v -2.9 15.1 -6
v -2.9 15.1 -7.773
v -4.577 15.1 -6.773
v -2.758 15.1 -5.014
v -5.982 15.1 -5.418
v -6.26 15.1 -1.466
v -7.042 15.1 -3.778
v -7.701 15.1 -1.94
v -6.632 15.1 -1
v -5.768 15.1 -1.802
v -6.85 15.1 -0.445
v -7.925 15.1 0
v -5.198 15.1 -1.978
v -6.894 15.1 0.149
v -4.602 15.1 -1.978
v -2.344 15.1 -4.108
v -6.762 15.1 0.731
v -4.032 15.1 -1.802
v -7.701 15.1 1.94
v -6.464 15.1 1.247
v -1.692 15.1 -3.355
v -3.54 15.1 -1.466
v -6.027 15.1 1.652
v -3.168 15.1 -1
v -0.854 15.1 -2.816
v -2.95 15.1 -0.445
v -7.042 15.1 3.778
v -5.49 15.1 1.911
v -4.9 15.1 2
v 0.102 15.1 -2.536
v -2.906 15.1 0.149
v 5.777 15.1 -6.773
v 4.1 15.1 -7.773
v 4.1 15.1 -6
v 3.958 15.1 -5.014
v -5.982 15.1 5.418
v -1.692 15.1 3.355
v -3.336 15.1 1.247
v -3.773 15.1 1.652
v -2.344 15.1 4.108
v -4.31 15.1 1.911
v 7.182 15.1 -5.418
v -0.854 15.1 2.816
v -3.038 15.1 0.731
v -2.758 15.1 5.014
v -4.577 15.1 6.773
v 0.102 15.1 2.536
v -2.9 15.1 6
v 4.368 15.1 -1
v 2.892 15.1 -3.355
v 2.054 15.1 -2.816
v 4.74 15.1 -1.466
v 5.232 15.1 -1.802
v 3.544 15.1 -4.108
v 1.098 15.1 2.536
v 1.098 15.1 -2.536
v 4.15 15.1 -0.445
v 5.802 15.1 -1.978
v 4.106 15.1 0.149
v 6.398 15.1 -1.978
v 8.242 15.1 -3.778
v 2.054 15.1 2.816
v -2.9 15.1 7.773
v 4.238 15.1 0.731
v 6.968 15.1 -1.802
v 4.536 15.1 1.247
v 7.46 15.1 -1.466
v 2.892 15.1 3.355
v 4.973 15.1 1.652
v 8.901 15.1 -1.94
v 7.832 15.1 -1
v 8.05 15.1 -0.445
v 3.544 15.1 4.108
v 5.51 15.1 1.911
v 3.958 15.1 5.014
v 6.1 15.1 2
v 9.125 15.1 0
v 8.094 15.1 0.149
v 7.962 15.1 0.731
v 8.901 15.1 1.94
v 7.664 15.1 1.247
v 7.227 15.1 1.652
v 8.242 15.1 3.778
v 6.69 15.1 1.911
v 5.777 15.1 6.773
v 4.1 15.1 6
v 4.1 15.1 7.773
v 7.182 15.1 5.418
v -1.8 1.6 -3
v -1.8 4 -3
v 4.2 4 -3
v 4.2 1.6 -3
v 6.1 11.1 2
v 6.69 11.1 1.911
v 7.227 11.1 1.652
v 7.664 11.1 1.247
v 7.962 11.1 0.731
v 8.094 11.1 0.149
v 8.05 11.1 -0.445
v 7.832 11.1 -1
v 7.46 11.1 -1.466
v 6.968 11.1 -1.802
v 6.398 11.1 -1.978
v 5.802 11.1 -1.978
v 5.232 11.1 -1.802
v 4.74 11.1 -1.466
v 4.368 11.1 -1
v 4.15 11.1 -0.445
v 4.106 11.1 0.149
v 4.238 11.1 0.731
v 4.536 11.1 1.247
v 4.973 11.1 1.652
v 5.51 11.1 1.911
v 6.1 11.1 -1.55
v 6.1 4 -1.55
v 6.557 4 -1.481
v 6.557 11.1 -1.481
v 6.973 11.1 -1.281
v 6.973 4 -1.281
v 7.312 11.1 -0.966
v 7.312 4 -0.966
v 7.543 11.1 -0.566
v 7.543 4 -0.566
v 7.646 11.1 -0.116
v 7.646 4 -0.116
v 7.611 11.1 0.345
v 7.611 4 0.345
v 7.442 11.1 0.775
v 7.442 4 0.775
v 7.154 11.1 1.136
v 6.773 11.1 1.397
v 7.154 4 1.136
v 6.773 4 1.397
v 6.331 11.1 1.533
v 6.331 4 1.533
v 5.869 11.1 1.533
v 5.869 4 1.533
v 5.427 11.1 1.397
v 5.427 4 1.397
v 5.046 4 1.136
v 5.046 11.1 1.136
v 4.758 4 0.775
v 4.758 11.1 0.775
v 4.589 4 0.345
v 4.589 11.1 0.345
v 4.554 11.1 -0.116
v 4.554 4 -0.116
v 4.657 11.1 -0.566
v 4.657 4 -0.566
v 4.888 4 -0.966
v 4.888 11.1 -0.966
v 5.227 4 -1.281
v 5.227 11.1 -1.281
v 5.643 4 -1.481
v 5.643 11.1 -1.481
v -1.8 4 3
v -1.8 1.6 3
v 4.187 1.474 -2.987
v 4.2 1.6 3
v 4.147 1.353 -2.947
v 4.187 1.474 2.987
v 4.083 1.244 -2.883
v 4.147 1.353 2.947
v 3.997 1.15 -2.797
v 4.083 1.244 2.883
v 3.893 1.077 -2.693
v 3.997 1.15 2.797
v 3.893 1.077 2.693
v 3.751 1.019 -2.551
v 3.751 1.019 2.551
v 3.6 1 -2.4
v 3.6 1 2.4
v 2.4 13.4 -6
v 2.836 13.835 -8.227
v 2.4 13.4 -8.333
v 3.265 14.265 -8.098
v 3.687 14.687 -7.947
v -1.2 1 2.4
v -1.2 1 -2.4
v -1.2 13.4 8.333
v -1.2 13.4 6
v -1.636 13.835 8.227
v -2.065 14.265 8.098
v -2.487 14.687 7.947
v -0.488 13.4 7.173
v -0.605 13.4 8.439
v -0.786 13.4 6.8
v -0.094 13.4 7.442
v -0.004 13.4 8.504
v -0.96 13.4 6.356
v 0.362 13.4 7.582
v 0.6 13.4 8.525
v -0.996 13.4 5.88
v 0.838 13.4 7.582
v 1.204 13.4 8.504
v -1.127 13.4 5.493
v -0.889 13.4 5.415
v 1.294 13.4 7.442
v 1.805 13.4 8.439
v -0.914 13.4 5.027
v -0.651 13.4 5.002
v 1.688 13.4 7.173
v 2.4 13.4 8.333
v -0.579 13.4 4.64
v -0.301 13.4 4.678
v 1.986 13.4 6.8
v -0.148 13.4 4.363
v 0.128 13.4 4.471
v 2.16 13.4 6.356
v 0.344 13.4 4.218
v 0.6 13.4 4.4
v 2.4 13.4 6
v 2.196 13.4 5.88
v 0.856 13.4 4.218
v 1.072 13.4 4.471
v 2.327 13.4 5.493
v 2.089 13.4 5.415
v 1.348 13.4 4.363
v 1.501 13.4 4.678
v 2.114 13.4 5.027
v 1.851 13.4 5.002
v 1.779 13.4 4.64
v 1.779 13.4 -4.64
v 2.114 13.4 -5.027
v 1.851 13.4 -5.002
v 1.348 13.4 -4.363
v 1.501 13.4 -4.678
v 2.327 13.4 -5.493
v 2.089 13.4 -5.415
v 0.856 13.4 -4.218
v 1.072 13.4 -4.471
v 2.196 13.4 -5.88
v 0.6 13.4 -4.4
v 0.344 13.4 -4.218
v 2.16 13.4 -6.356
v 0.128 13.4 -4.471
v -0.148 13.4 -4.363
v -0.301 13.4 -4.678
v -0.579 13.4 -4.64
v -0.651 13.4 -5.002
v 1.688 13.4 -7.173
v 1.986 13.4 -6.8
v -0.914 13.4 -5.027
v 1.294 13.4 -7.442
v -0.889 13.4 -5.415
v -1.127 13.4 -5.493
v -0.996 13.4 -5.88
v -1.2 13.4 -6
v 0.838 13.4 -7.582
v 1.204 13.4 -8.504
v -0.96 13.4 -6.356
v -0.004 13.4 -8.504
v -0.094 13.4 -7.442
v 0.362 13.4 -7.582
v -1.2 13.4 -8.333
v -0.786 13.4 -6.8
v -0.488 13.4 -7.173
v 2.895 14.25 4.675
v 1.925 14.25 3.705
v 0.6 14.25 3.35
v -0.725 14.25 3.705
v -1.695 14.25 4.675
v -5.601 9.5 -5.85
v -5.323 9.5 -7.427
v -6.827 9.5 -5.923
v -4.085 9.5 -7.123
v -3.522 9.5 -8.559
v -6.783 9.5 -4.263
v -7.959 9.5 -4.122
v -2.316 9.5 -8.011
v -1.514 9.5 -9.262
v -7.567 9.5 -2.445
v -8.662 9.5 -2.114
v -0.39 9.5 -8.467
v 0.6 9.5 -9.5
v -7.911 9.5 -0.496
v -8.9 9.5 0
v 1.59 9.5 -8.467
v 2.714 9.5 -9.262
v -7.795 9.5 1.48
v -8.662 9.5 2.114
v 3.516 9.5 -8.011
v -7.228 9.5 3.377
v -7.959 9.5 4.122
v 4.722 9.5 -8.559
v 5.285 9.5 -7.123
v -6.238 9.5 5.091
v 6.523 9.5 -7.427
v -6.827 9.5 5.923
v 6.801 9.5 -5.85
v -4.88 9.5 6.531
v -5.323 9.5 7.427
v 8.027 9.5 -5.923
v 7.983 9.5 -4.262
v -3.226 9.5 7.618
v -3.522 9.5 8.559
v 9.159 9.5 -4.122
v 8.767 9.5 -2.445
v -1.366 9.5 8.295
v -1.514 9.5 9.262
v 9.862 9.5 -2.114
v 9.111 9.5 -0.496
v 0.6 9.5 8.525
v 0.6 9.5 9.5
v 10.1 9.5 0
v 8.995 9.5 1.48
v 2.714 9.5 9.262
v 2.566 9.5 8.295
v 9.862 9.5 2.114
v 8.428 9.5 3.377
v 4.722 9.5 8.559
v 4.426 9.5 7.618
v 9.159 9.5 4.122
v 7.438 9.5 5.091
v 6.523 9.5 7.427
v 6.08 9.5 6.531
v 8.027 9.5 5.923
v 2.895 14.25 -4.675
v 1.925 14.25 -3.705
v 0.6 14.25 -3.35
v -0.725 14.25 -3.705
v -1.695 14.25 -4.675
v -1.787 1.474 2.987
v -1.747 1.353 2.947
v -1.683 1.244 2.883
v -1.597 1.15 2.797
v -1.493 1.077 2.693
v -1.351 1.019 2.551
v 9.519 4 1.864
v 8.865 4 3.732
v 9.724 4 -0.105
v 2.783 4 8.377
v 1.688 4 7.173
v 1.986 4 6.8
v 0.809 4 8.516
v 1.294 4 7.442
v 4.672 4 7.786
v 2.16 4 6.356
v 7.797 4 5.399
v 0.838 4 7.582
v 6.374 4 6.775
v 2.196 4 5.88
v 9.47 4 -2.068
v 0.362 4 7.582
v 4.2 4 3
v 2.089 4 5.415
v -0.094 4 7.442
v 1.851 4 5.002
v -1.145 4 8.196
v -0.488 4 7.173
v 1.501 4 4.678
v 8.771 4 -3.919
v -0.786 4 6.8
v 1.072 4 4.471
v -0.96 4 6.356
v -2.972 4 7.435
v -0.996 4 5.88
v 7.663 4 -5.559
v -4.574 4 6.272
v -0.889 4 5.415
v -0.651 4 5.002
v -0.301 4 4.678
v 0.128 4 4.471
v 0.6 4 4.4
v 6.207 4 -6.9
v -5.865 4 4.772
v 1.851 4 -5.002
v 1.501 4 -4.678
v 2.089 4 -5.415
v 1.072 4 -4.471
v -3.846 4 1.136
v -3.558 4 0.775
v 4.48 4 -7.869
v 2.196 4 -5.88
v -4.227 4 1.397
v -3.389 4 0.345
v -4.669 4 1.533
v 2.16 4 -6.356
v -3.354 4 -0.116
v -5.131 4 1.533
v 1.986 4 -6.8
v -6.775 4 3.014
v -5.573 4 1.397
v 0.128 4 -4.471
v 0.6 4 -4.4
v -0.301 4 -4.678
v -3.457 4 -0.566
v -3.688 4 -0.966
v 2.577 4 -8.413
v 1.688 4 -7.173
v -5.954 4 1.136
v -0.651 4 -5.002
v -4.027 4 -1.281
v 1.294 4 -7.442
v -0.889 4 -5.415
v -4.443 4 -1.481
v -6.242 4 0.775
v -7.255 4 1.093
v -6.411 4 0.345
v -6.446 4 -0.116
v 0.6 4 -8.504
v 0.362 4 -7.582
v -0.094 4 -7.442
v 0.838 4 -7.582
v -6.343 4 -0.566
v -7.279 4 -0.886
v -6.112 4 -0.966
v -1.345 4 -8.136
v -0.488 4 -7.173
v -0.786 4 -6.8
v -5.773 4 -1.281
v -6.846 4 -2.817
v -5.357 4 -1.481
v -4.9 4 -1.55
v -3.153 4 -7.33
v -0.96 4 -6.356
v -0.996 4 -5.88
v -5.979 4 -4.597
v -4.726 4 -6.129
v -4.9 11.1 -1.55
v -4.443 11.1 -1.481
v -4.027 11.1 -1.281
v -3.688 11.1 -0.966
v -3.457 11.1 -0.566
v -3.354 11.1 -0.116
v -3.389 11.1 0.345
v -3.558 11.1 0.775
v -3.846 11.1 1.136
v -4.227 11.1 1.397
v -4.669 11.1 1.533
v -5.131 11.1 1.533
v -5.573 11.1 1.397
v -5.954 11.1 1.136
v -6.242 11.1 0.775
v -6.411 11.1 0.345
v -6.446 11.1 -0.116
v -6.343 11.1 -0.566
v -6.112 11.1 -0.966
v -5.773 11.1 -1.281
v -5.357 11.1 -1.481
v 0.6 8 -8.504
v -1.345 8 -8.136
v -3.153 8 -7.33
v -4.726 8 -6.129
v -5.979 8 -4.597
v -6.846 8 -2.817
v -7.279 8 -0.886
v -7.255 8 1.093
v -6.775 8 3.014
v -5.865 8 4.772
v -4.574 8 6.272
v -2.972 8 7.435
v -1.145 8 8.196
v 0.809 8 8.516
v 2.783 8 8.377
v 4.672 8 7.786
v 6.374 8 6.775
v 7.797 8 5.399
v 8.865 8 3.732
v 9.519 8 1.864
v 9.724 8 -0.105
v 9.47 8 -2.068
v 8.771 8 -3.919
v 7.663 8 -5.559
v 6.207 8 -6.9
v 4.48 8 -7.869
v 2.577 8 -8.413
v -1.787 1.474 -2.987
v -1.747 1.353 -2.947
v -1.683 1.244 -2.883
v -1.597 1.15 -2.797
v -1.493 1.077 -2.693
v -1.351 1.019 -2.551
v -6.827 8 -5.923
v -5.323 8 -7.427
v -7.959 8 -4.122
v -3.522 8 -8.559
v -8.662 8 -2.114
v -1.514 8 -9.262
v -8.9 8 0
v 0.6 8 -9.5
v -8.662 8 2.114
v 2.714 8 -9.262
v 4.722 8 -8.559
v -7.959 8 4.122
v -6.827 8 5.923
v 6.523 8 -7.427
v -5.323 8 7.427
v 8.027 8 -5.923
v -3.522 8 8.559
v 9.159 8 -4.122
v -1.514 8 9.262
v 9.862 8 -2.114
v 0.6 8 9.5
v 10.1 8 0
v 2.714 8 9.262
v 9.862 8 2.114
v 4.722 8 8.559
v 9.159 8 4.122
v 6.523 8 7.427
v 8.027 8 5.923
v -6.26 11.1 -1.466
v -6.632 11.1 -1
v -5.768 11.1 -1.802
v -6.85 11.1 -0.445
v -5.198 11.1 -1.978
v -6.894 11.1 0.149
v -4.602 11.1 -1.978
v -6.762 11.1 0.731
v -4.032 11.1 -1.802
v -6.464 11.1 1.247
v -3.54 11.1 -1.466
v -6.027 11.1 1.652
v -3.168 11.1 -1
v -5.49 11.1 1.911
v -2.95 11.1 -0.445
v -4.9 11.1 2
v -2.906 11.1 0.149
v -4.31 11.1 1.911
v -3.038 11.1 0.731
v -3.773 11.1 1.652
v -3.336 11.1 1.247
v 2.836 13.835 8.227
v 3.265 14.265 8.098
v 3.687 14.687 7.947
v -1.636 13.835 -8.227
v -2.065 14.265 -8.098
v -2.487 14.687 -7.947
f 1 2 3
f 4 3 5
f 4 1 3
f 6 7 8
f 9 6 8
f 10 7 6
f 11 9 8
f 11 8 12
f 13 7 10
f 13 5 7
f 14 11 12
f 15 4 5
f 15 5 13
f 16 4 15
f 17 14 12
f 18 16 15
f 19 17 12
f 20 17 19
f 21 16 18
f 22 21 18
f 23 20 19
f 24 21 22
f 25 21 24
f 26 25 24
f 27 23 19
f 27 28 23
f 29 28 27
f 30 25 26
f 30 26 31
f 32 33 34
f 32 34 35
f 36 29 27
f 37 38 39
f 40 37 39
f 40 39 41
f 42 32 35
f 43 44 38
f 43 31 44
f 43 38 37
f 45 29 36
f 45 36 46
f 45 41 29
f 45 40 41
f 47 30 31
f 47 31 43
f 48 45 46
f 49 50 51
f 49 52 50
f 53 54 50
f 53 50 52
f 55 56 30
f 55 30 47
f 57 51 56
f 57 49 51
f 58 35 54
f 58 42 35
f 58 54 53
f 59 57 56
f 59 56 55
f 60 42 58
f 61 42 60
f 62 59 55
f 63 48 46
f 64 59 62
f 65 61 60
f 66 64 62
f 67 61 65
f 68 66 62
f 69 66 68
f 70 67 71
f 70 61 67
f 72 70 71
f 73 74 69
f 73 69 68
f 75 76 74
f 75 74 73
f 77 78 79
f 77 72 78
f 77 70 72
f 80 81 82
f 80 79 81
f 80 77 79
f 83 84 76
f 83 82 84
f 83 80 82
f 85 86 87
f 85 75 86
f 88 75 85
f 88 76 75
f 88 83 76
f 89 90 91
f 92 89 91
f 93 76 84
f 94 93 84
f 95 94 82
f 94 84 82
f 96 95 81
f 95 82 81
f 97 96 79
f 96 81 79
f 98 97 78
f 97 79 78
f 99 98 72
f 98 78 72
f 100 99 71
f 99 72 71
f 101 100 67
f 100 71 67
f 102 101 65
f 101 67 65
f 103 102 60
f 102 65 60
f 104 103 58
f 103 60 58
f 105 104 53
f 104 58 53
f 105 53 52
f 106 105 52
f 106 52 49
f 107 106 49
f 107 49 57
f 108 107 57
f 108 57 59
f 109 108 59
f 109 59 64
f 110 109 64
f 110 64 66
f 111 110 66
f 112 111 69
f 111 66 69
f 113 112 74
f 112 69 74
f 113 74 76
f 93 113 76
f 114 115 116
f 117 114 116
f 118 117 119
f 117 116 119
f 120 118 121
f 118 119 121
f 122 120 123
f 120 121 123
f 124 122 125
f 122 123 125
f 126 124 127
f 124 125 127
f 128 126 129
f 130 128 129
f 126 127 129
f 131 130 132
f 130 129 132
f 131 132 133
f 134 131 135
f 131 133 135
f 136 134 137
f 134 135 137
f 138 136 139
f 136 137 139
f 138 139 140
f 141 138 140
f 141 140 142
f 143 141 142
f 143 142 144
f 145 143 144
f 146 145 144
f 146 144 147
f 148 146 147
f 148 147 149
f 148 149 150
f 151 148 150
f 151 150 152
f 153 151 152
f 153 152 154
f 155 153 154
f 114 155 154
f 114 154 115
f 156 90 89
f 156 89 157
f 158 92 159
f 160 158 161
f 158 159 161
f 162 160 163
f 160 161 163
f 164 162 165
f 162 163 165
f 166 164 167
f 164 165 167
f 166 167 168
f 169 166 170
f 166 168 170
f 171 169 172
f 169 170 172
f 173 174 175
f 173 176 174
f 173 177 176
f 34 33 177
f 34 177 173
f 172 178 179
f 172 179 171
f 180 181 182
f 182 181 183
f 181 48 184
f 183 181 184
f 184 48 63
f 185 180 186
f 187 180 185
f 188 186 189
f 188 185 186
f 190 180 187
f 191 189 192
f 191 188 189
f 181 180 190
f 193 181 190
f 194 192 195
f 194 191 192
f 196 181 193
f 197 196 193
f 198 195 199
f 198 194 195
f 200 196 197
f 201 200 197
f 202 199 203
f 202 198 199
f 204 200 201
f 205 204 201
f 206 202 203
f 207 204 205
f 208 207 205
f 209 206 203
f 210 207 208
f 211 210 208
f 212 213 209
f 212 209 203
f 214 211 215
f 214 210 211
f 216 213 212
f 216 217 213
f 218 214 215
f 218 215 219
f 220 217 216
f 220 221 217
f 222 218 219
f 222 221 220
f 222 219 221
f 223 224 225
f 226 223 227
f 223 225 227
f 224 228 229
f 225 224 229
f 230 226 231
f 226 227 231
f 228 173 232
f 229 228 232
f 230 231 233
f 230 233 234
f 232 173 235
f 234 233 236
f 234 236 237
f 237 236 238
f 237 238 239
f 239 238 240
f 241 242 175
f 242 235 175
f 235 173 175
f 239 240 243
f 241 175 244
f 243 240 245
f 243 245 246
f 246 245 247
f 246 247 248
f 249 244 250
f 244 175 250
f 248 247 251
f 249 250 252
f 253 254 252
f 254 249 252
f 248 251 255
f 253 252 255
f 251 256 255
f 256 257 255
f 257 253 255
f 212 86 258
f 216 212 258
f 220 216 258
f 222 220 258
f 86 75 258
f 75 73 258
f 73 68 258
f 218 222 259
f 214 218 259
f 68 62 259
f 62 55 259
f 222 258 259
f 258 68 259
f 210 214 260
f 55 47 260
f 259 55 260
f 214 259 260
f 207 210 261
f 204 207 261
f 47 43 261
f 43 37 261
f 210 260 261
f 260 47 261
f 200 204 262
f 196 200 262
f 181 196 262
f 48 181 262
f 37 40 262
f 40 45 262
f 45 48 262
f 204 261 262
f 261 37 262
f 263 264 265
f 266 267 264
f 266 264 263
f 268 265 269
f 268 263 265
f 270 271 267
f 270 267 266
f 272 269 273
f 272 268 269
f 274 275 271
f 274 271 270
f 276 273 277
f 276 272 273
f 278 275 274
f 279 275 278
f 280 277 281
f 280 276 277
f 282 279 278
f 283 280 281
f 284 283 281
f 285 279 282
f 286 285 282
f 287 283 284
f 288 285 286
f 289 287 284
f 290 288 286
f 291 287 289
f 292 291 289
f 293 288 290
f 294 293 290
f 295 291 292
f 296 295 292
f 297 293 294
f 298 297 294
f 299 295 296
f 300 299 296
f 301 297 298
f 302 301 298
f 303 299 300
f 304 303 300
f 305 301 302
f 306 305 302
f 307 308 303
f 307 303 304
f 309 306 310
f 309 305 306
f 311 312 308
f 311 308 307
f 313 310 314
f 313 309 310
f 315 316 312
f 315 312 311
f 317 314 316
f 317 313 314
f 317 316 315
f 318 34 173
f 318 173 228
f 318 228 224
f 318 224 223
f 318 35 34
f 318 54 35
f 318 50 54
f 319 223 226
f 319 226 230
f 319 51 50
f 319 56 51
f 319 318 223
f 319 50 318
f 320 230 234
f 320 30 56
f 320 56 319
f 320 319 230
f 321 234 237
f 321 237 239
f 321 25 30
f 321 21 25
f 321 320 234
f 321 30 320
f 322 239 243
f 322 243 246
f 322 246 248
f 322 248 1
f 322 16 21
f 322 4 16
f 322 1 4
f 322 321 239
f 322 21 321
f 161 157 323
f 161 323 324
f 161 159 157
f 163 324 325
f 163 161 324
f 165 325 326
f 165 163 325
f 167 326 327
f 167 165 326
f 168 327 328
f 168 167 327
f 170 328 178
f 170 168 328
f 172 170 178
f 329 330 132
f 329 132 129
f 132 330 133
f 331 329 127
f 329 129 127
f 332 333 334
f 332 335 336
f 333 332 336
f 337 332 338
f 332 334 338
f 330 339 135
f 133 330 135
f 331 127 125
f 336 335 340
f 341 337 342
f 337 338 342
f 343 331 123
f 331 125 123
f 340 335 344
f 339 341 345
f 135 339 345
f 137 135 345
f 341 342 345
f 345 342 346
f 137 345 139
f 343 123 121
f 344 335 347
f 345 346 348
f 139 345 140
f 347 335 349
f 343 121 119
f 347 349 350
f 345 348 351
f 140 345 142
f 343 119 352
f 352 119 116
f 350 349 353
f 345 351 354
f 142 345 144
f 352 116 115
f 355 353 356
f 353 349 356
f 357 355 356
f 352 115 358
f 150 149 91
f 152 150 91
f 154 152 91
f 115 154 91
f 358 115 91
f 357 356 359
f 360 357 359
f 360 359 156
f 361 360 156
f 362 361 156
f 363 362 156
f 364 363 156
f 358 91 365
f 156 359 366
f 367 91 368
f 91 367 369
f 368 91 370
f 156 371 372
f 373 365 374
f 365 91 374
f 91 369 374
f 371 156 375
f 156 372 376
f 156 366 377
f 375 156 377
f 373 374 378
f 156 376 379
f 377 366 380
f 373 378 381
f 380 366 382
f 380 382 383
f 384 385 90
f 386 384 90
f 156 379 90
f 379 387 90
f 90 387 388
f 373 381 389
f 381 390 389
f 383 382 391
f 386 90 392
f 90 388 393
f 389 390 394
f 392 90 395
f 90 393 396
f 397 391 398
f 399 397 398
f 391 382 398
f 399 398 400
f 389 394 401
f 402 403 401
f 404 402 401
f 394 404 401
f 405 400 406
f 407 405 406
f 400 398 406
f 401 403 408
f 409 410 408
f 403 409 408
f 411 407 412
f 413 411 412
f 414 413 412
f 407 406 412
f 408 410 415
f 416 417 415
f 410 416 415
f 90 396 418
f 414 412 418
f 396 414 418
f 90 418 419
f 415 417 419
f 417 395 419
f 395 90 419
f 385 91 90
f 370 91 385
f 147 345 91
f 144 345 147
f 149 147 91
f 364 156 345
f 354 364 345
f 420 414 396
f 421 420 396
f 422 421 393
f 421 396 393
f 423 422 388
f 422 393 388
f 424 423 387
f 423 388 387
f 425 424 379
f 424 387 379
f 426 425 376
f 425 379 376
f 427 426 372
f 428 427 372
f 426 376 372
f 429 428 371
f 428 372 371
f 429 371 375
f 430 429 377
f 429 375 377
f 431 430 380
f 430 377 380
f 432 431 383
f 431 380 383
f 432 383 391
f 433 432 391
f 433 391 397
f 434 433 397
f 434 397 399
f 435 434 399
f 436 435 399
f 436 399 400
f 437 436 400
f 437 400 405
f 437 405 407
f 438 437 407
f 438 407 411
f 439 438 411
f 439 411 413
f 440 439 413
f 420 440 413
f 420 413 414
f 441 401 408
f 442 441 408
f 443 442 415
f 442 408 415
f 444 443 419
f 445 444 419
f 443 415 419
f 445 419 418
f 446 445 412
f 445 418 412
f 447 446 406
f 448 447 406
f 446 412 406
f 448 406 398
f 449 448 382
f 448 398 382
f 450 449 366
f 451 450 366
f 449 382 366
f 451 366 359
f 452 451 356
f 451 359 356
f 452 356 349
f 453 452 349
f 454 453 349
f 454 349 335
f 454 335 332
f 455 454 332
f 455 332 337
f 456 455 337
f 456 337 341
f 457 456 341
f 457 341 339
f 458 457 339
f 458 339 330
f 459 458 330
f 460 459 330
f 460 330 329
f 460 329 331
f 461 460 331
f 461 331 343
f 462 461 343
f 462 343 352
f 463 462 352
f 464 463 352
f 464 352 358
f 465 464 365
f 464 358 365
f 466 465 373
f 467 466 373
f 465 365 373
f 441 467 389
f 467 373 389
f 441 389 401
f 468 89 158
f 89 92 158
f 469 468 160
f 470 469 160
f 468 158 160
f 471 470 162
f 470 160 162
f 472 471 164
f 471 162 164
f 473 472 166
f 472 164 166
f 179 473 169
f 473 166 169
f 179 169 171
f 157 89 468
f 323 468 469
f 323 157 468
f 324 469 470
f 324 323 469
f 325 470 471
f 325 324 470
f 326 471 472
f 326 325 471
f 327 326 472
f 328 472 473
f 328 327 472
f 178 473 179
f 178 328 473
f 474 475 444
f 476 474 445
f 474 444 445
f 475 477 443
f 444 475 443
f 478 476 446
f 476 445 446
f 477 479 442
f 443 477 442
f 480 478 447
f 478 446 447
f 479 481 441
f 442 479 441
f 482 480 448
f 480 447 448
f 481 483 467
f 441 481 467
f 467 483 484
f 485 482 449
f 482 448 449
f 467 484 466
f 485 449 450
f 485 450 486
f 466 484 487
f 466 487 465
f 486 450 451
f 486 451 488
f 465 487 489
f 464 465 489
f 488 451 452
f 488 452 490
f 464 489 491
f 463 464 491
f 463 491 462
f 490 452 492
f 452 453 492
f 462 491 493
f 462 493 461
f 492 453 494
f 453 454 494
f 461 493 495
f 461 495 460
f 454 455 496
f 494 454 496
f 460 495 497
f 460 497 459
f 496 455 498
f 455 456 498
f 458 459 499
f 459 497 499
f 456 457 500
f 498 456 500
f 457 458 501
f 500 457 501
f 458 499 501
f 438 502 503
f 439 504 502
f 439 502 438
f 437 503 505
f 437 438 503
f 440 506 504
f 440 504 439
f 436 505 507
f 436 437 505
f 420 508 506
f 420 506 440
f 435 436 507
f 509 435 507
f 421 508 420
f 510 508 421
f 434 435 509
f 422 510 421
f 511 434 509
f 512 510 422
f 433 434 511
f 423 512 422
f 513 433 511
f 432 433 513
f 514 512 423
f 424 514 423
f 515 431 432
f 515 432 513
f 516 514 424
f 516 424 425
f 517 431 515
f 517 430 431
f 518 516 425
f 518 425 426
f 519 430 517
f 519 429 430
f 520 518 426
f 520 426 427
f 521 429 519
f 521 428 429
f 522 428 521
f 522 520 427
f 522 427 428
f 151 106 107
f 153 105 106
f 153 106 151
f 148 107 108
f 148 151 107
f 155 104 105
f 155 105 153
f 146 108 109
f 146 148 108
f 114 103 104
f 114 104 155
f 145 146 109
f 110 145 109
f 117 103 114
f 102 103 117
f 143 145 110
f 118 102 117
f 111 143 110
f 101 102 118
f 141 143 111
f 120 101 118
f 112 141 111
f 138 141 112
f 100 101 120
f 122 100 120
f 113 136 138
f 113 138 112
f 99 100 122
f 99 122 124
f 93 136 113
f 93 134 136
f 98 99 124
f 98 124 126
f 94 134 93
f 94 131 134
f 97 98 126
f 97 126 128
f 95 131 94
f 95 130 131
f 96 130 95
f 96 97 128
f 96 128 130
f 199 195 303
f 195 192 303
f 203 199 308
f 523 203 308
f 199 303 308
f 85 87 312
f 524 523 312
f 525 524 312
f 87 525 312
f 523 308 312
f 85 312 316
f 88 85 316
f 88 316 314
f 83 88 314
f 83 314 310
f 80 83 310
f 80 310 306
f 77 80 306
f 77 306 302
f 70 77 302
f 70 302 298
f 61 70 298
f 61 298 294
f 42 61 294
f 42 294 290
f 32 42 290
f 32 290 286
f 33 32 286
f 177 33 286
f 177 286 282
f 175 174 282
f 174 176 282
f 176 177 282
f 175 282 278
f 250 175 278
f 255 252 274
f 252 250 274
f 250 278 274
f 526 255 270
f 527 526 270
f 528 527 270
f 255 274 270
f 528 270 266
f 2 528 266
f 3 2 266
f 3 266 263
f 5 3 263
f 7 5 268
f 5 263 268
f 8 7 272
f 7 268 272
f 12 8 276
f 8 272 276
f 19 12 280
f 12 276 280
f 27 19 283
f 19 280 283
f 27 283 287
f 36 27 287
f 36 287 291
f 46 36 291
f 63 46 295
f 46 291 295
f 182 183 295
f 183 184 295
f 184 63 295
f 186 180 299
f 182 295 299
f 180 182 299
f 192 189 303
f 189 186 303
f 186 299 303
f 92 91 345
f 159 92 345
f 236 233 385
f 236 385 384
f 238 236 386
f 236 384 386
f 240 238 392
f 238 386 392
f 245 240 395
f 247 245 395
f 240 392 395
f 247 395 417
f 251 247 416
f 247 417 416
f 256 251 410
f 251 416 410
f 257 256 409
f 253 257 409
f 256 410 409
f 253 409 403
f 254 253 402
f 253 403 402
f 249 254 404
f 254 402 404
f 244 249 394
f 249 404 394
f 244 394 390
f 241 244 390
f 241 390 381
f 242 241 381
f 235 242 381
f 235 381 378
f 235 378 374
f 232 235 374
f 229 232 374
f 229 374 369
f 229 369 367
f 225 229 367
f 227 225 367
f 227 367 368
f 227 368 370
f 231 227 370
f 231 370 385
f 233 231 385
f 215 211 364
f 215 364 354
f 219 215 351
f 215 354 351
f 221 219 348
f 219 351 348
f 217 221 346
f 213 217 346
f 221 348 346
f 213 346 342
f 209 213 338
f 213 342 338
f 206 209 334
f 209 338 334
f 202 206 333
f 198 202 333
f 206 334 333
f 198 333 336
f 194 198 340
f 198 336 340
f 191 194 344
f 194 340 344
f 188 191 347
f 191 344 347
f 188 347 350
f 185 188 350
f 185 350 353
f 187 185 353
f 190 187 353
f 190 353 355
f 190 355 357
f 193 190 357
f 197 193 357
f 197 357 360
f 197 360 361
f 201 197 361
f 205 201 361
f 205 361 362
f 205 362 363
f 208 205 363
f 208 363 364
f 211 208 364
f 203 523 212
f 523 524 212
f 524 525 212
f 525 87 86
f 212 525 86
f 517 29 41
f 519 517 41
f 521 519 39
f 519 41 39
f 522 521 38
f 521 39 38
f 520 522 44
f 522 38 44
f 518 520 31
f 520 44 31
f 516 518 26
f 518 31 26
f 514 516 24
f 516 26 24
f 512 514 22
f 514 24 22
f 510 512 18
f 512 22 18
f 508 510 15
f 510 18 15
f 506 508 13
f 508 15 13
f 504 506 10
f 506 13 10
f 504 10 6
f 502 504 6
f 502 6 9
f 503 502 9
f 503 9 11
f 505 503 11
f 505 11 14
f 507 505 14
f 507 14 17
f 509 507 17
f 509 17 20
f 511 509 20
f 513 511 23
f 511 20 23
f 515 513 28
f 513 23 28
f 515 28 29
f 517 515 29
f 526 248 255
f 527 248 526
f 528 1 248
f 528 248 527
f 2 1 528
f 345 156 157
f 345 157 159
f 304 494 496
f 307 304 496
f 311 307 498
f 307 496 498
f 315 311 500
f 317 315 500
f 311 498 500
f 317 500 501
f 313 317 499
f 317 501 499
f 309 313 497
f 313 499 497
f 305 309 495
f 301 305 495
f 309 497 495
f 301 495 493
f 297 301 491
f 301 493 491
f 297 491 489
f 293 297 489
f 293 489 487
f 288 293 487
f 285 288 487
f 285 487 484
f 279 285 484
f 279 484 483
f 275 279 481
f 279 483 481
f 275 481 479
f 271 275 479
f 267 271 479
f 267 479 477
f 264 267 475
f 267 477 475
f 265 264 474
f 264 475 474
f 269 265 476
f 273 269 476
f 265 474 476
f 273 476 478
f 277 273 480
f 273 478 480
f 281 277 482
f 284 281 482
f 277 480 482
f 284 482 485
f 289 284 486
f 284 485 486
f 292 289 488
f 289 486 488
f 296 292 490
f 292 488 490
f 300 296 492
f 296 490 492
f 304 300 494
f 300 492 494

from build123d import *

# Parameters (mm, degrees)
SKETCH1_R            = 8.525
BOSS_EXTRUDE11_DEPTH = 4
SKETCH20_R           = 8.525
BOSS_EXTRUDE12_DEPTH = 4
SKETCH21_R           = 9.5
BOSS_EXTRUDE13_DEPTH = 1.5
SKETCH22_R           = 8.525
BOSS_EXTRUDE14_DEPTH = 5.6
BOSS_EXTRUDE15_START = 14.75
SKETCH30_R           = 8.525
BOSS_EXTRUDE15_DEPTH = 14.75
SKETCH33_R           = 2.1
CUT_EXTRUDE14_DEPTH  = 5.8
BOSS_EXTRUDE16_START = 1.25
SKETCH35_R           = 9.5
BOSS_EXTRUDE16_DEPTH = 1.25
SKETCH36_R           = 1.6
CUT_EXTRUDE15_DEPTH  = 29.85
CIRPATTERN1_COUNT    = 2
SKETCH43_R           = 1.55
CUT_EXTRUDE20_DEPTH  = 29.85
SKETCH44_R           = 2
CUT_EXTRUDE21_DEPTH  = 4
CUT_EXTRUDE22_DEPTH  = 1.7
CUT_EXTRUDE23_DEPTH  = 3
SKETCH47_W           = 28.870202412
SKETCH47_H           = 25.831233738
CUT_EXTRUDE24_DEPTH  = 18.75
SKETCH48_W           = 6
SKETCH48_H           = 6
BOSS_EXTRUDE17_DEPTH = 3
FILLET1_R            = 0.6
CHAMFER1_SIZE        = 1.7


with BuildPart() as part:
    # Sketch1 → Boss-Extrude11 (new body)
    with BuildSketch(Plane(origin=(0, 0, 0), x_dir=(1, 0, 0), z_dir=(0, 1, 0))):
        with Locations(Location((0, 0, 0), (0, 0, 270))):
            Circle(SKETCH1_R)
    extrude(amount=BOSS_EXTRUDE11_DEPTH)

    # Sketch20 → Boss-Extrude12 (add)
    with BuildSketch(Plane(origin=(0, 4, 0), x_dir=(1, 0, 0), z_dir=(0, 1, 0))):
        with Locations(Location((1.2, 0, 0), (0, 0, 94.035884191))):
            Circle(SKETCH20_R)
    extrude(amount=BOSS_EXTRUDE12_DEPTH)

    # Sketch21 → Boss-Extrude13 (add)
    with BuildSketch(Plane(origin=(0, 8, 0), x_dir=(1, 0, 0), z_dir=(0, 1, 0))):
        with Locations(Location((0.6, 0, 0), (0, 0, 270))):
            Circle(SKETCH21_R)
    extrude(amount=BOSS_EXTRUDE13_DEPTH)

    # Sketch22 → Boss-Extrude14 (add)
    with BuildSketch(Plane(origin=(0, 9.5, 0), x_dir=(1, 0, 0), z_dir=(0, 1, 0))):
        with Locations(Location((0.6, 0, 0), (0, 0, 270))):
            Circle(SKETCH22_R)
    extrude(amount=BOSS_EXTRUDE14_DEPTH)

    # Sketch30 → Boss-Extrude15 (add)
    with BuildSketch(Plane.XZ.offset(BOSS_EXTRUDE15_START)):
        with Locations(Location((0.6, 0, 0), (0, 0, 90))):
            Circle(SKETCH30_R)
    extrude(amount=-BOSS_EXTRUDE15_DEPTH)

    # Sketch33 → Cut-Extrude14 (cut)
    with BuildSketch(Plane.XZ.offset(14.75)):
        with Locations(Location((0.6, 0, 0), (0, 0, 270))):
            Circle(SKETCH33_R)
    extrude(amount=-CUT_EXTRUDE14_DEPTH, mode=Mode.SUBTRACT)

    # Sketch35 → Boss-Extrude16 (add)
    with BuildSketch(Plane.XZ.offset(BOSS_EXTRUDE16_START)):
        with Locations(Location((0.6, 0, 0), (0, 0, 90))):
            Circle(SKETCH35_R)
    extrude(amount=-BOSS_EXTRUDE16_DEPTH)

    # Sketch36 → Cut-Extrude15 (cut)
    with BuildSketch(Plane.XZ.offset(14.75)):
        with Locations(Location((0.6, 6, 0), (0, 0, 270))):
            Circle(SKETCH36_R)
    cut_extrude15 = extrude(amount=-CUT_EXTRUDE15_DEPTH, mode=Mode.SUBTRACT)

    # CirPattern1: Cut-Extrude15 ×2 about axis
    cirpattern1_axis = Axis((0.6, 0, 0), (0, 1, 0))
    for i in range(1, CIRPATTERN1_COUNT):
        add(cut_extrude15.rotate(cirpattern1_axis, i * 360 / CIRPATTERN1_COUNT), mode=Mode.SUBTRACT)

    # Sketch43 → Cut-Extrude20 (cut)
    with BuildSketch(Plane.XZ.offset(14.75)):
        with Locations(Location((-4.9, 0, 0), (0, 0, 270))):
            Circle(SKETCH43_R)
        with Locations(Location((6.1, 0, 0), (0, 0, 270))):
            Circle(SKETCH43_R)
    extrude(amount=-CUT_EXTRUDE20_DEPTH, mode=Mode.SUBTRACT)

    # Sketch44 → Cut-Extrude21 (cut)
    with BuildSketch(Plane(origin=(0, 15.1, 0), x_dir=(1, 0, 0), z_dir=(0, 1, 0))):
        with Locations(Location((-4.9, 0, 0), (0, 0, 270))):
            Circle(SKETCH44_R)
        with Locations(Location((6.1, 0, 0), (0, 0, 270))):
            Circle(SKETCH44_R)
    extrude(amount=-CUT_EXTRUDE21_DEPTH, mode=Mode.SUBTRACT)

    # Sketch45 → Cut-Extrude22 (cut)
    with BuildSketch(Plane(origin=(0, 15.1, 0), x_dir=(1, 0, 0), z_dir=(0, 1, 0))):
        with BuildLine():
            Line((-2.9, -6), (-2.9, -10.872564071))
            Line((-2.9, -10.872564071), (4.1, -10.872564071))
            Line((4.1, -10.872564071), (4.1, -6))
            ThreePointArc((4.1, -6), (0.6, -2.5), (-2.9, -6))
        make_face()
        with BuildLine():
            Line((-2.9, 6), (-2.9, 11.42214608))
            Line((-2.9, 11.42214608), (4.1, 11.42214608))
            Line((4.1, 11.42214608), (4.1, 6))
            ThreePointArc((4.1, 6), (0.6, 2.5), (-2.9, 6))
        make_face()
    extrude(amount=-CUT_EXTRUDE22_DEPTH, mode=Mode.SUBTRACT)

    # Sketch46 → Cut-Extrude23 (cut)
    with BuildSketch(Plane.XZ.offset(14.75)):
        with BuildLine():
            Line((-4.9, 3), (-9.719928829, 3))
            Line((-9.719928829, 3), (-9.719928829, -3))
            Line((-9.719928829, -3), (-4.9, -3))
            ThreePointArc((-4.9, -3), (-1.9, 0), (-4.9, 3))
        make_face()
        with BuildLine():
            Line((6.1, 3), (10.889396495, 3))
            Line((10.889396495, 3), (10.889396495, -3))
            Line((10.889396495, -3), (6.1, -3))
            ThreePointArc((6.1, -3), (3.1, 0), (6.1, 3))
        make_face()
    extrude(amount=-CUT_EXTRUDE23_DEPTH, mode=Mode.SUBTRACT)

    # Sketch47 → Cut-Extrude24 (cut)
    with BuildSketch(Plane.XZ.offset(14.75)):
        with Locations((1.011527008, 0.205763504)):
            Rectangle(SKETCH47_W, SKETCH47_H)
    extrude(amount=-CUT_EXTRUDE24_DEPTH, mode=Mode.SUBTRACT)

    # Sketch48 → Boss-Extrude17 (add)
    with BuildSketch(Plane.XZ.offset(-4)):
        with Locations((1.2, 0)):
            Rectangle(SKETCH48_W, SKETCH48_H)
    extrude(amount=BOSS_EXTRUDE17_DEPTH)

    # Fillet1
    fillet1_edges = [part.edges().sort_by_distance(p)[0] for p in [
        (-1.8, 1, 0),
        (1.2, 1, -3),
        (4.2, 1, 0),
        (1.2, 1, 3),
    ]]
    fillet(fillet1_edges, radius=FILLET1_R)

    # Chamfer1
    chamfer1_edges = [part.edges().sort_by_distance(p)[0] for p in [
        (4.1, 13.4, 6.886696058),
        (-2.9, 13.4, 6.886696058),
        (-2.9, 13.4, -6.886696058),
        (4.1, 13.4, -6.886696058),
        (0.6, 13.4, 2.5),
        (0.6, 13.4, -2.5),
    ]]
    chamfer(chamfer1_edges, length=CHAMFER1_SIZE - 0.0001)  # a hair under: the kernel refuses the full size


solid = part.part
